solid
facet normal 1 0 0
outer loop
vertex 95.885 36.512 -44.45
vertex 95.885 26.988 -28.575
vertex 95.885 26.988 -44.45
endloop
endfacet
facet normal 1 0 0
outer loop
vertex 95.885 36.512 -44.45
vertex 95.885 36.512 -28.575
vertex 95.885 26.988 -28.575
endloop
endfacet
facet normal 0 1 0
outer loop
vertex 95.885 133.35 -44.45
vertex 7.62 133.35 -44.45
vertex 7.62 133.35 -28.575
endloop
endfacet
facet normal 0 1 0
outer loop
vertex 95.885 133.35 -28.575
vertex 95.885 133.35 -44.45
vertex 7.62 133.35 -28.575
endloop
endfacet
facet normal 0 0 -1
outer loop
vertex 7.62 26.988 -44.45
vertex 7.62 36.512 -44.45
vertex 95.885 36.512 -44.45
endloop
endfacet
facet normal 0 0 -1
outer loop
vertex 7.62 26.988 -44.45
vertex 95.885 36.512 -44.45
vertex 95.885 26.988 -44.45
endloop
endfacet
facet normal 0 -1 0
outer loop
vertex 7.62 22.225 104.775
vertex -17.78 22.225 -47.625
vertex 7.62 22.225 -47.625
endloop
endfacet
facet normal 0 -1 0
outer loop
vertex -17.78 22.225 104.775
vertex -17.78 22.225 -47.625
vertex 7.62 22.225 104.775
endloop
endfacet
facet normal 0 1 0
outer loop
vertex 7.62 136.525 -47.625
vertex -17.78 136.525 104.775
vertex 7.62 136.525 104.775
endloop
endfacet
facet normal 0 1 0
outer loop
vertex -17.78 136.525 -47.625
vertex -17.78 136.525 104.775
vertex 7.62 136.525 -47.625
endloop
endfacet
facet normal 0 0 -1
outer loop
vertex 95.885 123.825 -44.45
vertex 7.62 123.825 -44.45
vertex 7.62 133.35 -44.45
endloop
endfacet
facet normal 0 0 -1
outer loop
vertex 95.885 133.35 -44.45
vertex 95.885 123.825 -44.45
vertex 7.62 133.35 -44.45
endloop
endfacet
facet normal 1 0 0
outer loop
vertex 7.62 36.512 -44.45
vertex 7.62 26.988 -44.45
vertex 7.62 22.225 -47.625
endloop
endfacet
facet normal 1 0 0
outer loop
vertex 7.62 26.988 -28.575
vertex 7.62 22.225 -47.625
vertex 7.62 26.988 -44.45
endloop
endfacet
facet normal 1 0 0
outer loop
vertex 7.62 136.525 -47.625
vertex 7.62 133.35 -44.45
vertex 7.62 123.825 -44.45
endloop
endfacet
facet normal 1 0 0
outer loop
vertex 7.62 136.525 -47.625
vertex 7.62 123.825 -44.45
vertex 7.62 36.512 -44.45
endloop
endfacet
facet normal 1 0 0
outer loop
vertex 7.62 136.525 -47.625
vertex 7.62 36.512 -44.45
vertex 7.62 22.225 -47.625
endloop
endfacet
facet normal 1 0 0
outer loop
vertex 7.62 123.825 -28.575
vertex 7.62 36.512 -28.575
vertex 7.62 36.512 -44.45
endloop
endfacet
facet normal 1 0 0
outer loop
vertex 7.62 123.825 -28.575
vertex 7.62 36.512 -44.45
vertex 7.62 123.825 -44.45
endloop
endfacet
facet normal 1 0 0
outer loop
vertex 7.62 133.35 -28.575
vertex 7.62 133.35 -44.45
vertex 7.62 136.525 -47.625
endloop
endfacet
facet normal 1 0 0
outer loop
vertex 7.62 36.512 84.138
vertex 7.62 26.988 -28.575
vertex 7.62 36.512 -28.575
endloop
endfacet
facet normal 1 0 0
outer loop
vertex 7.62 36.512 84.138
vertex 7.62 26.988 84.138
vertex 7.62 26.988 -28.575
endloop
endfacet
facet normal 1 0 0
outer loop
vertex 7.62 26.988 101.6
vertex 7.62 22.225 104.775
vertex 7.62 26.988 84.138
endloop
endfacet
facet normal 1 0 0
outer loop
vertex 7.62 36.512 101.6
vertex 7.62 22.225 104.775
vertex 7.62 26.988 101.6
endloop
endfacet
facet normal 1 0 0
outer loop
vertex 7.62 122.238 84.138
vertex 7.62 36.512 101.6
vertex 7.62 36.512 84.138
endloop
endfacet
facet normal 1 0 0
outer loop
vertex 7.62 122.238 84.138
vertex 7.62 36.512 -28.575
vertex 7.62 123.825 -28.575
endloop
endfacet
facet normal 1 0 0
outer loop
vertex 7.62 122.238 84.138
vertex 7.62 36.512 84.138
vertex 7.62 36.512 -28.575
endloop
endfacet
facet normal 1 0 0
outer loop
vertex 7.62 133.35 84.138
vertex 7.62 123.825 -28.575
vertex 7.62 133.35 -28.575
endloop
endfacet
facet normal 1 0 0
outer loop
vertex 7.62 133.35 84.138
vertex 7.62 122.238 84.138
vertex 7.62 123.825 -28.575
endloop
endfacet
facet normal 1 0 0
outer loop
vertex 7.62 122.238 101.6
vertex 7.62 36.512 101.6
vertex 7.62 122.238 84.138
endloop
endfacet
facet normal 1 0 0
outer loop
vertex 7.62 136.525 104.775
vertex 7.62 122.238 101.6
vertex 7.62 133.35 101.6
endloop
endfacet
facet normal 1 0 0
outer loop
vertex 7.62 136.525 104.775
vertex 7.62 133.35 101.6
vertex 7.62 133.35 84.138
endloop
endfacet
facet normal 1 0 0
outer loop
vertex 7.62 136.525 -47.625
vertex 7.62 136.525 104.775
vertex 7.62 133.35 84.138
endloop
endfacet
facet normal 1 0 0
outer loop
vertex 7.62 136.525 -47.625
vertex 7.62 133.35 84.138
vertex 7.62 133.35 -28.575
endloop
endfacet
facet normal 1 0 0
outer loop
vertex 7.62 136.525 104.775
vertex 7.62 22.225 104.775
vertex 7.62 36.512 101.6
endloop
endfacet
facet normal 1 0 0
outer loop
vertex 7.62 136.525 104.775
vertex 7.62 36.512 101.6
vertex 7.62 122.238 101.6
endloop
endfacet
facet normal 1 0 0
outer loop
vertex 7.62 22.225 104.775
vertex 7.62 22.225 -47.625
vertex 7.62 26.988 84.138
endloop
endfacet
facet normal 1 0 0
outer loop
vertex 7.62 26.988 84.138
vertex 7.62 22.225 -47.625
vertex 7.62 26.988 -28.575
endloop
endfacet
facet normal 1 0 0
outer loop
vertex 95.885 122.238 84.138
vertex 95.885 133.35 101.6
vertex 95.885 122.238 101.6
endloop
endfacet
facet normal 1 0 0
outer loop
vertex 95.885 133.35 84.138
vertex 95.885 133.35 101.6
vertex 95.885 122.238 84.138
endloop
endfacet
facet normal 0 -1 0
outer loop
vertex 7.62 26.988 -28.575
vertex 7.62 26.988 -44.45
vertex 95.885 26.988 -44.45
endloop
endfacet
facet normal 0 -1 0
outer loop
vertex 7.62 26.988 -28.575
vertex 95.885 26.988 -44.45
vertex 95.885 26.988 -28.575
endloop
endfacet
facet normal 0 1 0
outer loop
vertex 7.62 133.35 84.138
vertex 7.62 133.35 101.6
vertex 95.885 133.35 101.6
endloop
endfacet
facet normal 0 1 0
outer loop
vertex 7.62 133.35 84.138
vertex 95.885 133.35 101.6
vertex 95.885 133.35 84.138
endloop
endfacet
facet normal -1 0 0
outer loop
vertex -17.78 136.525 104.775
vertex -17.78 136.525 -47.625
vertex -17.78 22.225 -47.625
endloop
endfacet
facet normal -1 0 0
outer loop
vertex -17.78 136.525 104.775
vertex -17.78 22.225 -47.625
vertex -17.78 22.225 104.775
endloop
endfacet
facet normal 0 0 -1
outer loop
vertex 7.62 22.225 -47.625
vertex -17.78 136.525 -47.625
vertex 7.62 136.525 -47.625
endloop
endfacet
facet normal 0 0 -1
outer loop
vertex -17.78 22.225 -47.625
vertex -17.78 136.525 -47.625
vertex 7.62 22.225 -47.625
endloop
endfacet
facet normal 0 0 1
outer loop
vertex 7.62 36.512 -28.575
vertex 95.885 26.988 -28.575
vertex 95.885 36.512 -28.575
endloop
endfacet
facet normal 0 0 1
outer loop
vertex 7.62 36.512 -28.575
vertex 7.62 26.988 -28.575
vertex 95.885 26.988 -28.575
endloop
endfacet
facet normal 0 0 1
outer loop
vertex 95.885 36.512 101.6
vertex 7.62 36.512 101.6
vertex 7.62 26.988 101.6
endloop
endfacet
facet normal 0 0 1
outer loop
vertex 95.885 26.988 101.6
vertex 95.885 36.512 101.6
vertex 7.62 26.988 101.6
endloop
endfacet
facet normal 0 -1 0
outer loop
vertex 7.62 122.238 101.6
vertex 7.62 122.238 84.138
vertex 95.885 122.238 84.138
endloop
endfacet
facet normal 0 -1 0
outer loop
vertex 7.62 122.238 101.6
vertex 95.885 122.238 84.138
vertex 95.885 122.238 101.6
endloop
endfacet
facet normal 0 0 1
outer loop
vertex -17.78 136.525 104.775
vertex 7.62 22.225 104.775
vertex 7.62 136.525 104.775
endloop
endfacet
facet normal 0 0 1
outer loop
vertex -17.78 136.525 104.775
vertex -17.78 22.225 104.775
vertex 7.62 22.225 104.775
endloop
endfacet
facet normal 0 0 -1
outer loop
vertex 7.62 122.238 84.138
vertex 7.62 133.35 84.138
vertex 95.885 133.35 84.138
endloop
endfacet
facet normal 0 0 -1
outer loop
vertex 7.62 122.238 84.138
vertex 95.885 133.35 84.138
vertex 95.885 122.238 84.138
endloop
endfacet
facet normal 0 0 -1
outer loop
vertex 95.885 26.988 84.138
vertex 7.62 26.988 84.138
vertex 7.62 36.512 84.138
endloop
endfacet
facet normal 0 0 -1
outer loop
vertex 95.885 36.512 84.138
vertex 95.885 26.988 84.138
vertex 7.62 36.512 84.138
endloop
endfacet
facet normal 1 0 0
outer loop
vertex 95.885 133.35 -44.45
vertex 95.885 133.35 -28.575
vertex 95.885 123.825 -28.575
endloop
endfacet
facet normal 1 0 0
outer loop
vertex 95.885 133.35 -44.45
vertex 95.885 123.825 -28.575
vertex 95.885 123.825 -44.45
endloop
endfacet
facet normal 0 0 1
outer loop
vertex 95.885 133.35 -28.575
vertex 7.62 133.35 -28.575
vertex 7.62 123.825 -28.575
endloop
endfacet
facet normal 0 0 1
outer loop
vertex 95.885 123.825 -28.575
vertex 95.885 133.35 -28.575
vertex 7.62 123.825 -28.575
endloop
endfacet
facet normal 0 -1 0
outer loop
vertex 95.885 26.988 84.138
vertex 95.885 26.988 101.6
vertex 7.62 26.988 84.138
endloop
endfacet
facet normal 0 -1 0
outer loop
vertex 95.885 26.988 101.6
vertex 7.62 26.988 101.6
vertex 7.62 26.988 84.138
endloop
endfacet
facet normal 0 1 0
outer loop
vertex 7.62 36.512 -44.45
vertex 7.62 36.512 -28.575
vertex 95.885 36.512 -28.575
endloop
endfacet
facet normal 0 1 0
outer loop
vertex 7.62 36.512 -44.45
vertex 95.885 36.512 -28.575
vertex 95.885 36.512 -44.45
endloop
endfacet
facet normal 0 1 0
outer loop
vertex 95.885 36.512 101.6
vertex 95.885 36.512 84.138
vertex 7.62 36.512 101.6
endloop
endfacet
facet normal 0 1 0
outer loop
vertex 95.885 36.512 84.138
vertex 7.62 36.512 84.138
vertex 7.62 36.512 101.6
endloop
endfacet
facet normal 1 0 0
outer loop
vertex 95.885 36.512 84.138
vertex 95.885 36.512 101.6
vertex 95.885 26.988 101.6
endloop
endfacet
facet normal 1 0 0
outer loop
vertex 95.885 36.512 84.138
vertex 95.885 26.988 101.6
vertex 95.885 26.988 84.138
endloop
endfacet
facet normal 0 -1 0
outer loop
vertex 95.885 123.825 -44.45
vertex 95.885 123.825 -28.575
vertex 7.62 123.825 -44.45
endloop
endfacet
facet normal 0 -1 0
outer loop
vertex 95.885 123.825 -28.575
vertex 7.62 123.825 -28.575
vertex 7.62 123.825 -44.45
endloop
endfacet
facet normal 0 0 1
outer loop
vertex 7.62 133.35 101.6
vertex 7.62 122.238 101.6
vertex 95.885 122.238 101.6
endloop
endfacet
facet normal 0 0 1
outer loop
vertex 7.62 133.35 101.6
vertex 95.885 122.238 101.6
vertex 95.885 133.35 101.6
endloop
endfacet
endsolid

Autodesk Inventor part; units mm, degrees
ref_plane "YZ Plane" through (0, 0, 0) normal (1, 0, 0) x (0, 1, 0)
ref_plane "XZ Plane" through (0, 0, 0) normal (0, 1, 0) x (-1, 0, 0)
ref_plane "XY Plane" through (0, 0, 0) normal (0, 0, 1) x (1, 0, 0)
sketch "Sketch1" plane through (0, 0, 0) normal (1, 0, 0) x (0, 1, 0)
  line L0 (22.225, 104.775) -> (136.525, 104.775)
  line L1 (136.525, 104.775) -> (136.525, -47.625)
  line L2 (136.525, -47.625) -> (22.225, -47.625)
  line L3 (22.225, -47.625) -> (22.225, 104.775)
  point P0 (0, 0)
  dimension "d0" = 114.3
  dimension "d1" = 152.4
extrude "Extrusion1" add sketch "Sketch1" along normal blind 7.62
sketch "Sketch2" plane through (7.62, 0, 0) normal (1, 0, 0) x (0, 0, -1)
  line L0 (-101.6, 133.35) -> (-84.1375, 133.35)
  line L1 (-84.1375, 133.35) -> (-84.1375, 122.2375)
  line L2 (-84.1375, 122.2375) -> (-101.6, 122.2375)
  line L3 (-101.6, 122.2375) -> (-101.6, 133.35)
  line L4 (-101.6, 26.9875) -> (-84.1375, 26.9875)
  line L5 (-84.1375, 26.9875) -> (-84.1375, 36.5125)
  line L6 (-84.1375, 36.5125) -> (-101.6, 36.5125)
  line L7 (-101.6, 36.5125) -> (-101.6, 26.9875)
  line L8 (44.45, 133.35) -> (28.575, 133.35)
  line L9 (28.575, 133.35) -> (28.575, 123.825)
  line L10 (28.575, 123.825) -> (44.45, 123.825)
  line L11 (44.45, 123.825) -> (44.45, 133.35)
  line L12 (44.45, 26.9875) -> (28.575, 26.9875)
  line L13 (28.575, 26.9875) -> (28.575, 36.5125)
  line L14 (28.575, 36.5125) -> (44.45, 36.5125)
  line L15 (44.45, 36.5125) -> (44.45, 26.9875)
  point P0 (0, 0)
extrude "Extrusion2" add sketch "Sketch2" along normal blind 88.265
sketch "Sketch3" plane through (0, 0, 0) normal (-1, 0, 0) x (0, 0, 1)
  line L0 (-47.625, 22.225) -> (-47.625, 136.525) projected
  line L1 (-47.625, 136.525) -> (104.775, 136.525) projected
  line L2 (-47.625, 22.225) -> (-39.6875, 22.225)
  line L3 (-39.6875, 22.225) -> (-39.6875, 136.525)
  line L4 (-39.6875, 136.525) -> (-47.625, 136.525)
  line L5 (-47.625, 136.525) -> (-47.625, 22.225)
  line L6 (104.775, 136.525) -> (104.775, 22.225) projected
  line L7 (-47.625, 136.525) -> (104.775, 136.525)
  line L8 (104.775, 136.525) -> (104.775, 128.5875)
  line L9 (-47.625, 128.5875) -> (-47.625, 136.525)
  line L10 (104.775, 22.225) -> (-47.625, 22.225) projected
  line L11 (104.775, 136.525) -> (96.8375, 136.525)
  line L12 (96.8375, 22.225) -> (104.775, 22.225)
  line L13 (104.775, 22.225) -> (104.775, 136.525)
  line L14 (-47.625, 22.225) -> (104.775, 22.225)
  line L15 (104.775, 22.225) -> (104.775, 30.1625)
  line L16 (104.775, 30.1625) -> (-47.625, 30.1625)
  line L17 (-47.625, 30.1625) -> (-47.625, 22.225)
  line L18 (-47.625, 136.525) -> (104.775, 136.525)
  line L19 (104.775, 136.525) -> (104.775, 128.5875)
  line L20 (104.775, 128.5875) -> (-47.625, 128.5875)
  line L21 (-47.625, 128.5875) -> (-47.625, 136.525)
  point P0 (0, 0)
extrude "Extrusion3" add sketch "Sketch3" along normal blind 17.78
sketch "Sketch4" plane through (7.62, 22.225, -47.625) normal (0, -1, 0) x (1, 0, 0)
  point P0 (-7.62, 47.625)
properties part number "TABLE NEW"
